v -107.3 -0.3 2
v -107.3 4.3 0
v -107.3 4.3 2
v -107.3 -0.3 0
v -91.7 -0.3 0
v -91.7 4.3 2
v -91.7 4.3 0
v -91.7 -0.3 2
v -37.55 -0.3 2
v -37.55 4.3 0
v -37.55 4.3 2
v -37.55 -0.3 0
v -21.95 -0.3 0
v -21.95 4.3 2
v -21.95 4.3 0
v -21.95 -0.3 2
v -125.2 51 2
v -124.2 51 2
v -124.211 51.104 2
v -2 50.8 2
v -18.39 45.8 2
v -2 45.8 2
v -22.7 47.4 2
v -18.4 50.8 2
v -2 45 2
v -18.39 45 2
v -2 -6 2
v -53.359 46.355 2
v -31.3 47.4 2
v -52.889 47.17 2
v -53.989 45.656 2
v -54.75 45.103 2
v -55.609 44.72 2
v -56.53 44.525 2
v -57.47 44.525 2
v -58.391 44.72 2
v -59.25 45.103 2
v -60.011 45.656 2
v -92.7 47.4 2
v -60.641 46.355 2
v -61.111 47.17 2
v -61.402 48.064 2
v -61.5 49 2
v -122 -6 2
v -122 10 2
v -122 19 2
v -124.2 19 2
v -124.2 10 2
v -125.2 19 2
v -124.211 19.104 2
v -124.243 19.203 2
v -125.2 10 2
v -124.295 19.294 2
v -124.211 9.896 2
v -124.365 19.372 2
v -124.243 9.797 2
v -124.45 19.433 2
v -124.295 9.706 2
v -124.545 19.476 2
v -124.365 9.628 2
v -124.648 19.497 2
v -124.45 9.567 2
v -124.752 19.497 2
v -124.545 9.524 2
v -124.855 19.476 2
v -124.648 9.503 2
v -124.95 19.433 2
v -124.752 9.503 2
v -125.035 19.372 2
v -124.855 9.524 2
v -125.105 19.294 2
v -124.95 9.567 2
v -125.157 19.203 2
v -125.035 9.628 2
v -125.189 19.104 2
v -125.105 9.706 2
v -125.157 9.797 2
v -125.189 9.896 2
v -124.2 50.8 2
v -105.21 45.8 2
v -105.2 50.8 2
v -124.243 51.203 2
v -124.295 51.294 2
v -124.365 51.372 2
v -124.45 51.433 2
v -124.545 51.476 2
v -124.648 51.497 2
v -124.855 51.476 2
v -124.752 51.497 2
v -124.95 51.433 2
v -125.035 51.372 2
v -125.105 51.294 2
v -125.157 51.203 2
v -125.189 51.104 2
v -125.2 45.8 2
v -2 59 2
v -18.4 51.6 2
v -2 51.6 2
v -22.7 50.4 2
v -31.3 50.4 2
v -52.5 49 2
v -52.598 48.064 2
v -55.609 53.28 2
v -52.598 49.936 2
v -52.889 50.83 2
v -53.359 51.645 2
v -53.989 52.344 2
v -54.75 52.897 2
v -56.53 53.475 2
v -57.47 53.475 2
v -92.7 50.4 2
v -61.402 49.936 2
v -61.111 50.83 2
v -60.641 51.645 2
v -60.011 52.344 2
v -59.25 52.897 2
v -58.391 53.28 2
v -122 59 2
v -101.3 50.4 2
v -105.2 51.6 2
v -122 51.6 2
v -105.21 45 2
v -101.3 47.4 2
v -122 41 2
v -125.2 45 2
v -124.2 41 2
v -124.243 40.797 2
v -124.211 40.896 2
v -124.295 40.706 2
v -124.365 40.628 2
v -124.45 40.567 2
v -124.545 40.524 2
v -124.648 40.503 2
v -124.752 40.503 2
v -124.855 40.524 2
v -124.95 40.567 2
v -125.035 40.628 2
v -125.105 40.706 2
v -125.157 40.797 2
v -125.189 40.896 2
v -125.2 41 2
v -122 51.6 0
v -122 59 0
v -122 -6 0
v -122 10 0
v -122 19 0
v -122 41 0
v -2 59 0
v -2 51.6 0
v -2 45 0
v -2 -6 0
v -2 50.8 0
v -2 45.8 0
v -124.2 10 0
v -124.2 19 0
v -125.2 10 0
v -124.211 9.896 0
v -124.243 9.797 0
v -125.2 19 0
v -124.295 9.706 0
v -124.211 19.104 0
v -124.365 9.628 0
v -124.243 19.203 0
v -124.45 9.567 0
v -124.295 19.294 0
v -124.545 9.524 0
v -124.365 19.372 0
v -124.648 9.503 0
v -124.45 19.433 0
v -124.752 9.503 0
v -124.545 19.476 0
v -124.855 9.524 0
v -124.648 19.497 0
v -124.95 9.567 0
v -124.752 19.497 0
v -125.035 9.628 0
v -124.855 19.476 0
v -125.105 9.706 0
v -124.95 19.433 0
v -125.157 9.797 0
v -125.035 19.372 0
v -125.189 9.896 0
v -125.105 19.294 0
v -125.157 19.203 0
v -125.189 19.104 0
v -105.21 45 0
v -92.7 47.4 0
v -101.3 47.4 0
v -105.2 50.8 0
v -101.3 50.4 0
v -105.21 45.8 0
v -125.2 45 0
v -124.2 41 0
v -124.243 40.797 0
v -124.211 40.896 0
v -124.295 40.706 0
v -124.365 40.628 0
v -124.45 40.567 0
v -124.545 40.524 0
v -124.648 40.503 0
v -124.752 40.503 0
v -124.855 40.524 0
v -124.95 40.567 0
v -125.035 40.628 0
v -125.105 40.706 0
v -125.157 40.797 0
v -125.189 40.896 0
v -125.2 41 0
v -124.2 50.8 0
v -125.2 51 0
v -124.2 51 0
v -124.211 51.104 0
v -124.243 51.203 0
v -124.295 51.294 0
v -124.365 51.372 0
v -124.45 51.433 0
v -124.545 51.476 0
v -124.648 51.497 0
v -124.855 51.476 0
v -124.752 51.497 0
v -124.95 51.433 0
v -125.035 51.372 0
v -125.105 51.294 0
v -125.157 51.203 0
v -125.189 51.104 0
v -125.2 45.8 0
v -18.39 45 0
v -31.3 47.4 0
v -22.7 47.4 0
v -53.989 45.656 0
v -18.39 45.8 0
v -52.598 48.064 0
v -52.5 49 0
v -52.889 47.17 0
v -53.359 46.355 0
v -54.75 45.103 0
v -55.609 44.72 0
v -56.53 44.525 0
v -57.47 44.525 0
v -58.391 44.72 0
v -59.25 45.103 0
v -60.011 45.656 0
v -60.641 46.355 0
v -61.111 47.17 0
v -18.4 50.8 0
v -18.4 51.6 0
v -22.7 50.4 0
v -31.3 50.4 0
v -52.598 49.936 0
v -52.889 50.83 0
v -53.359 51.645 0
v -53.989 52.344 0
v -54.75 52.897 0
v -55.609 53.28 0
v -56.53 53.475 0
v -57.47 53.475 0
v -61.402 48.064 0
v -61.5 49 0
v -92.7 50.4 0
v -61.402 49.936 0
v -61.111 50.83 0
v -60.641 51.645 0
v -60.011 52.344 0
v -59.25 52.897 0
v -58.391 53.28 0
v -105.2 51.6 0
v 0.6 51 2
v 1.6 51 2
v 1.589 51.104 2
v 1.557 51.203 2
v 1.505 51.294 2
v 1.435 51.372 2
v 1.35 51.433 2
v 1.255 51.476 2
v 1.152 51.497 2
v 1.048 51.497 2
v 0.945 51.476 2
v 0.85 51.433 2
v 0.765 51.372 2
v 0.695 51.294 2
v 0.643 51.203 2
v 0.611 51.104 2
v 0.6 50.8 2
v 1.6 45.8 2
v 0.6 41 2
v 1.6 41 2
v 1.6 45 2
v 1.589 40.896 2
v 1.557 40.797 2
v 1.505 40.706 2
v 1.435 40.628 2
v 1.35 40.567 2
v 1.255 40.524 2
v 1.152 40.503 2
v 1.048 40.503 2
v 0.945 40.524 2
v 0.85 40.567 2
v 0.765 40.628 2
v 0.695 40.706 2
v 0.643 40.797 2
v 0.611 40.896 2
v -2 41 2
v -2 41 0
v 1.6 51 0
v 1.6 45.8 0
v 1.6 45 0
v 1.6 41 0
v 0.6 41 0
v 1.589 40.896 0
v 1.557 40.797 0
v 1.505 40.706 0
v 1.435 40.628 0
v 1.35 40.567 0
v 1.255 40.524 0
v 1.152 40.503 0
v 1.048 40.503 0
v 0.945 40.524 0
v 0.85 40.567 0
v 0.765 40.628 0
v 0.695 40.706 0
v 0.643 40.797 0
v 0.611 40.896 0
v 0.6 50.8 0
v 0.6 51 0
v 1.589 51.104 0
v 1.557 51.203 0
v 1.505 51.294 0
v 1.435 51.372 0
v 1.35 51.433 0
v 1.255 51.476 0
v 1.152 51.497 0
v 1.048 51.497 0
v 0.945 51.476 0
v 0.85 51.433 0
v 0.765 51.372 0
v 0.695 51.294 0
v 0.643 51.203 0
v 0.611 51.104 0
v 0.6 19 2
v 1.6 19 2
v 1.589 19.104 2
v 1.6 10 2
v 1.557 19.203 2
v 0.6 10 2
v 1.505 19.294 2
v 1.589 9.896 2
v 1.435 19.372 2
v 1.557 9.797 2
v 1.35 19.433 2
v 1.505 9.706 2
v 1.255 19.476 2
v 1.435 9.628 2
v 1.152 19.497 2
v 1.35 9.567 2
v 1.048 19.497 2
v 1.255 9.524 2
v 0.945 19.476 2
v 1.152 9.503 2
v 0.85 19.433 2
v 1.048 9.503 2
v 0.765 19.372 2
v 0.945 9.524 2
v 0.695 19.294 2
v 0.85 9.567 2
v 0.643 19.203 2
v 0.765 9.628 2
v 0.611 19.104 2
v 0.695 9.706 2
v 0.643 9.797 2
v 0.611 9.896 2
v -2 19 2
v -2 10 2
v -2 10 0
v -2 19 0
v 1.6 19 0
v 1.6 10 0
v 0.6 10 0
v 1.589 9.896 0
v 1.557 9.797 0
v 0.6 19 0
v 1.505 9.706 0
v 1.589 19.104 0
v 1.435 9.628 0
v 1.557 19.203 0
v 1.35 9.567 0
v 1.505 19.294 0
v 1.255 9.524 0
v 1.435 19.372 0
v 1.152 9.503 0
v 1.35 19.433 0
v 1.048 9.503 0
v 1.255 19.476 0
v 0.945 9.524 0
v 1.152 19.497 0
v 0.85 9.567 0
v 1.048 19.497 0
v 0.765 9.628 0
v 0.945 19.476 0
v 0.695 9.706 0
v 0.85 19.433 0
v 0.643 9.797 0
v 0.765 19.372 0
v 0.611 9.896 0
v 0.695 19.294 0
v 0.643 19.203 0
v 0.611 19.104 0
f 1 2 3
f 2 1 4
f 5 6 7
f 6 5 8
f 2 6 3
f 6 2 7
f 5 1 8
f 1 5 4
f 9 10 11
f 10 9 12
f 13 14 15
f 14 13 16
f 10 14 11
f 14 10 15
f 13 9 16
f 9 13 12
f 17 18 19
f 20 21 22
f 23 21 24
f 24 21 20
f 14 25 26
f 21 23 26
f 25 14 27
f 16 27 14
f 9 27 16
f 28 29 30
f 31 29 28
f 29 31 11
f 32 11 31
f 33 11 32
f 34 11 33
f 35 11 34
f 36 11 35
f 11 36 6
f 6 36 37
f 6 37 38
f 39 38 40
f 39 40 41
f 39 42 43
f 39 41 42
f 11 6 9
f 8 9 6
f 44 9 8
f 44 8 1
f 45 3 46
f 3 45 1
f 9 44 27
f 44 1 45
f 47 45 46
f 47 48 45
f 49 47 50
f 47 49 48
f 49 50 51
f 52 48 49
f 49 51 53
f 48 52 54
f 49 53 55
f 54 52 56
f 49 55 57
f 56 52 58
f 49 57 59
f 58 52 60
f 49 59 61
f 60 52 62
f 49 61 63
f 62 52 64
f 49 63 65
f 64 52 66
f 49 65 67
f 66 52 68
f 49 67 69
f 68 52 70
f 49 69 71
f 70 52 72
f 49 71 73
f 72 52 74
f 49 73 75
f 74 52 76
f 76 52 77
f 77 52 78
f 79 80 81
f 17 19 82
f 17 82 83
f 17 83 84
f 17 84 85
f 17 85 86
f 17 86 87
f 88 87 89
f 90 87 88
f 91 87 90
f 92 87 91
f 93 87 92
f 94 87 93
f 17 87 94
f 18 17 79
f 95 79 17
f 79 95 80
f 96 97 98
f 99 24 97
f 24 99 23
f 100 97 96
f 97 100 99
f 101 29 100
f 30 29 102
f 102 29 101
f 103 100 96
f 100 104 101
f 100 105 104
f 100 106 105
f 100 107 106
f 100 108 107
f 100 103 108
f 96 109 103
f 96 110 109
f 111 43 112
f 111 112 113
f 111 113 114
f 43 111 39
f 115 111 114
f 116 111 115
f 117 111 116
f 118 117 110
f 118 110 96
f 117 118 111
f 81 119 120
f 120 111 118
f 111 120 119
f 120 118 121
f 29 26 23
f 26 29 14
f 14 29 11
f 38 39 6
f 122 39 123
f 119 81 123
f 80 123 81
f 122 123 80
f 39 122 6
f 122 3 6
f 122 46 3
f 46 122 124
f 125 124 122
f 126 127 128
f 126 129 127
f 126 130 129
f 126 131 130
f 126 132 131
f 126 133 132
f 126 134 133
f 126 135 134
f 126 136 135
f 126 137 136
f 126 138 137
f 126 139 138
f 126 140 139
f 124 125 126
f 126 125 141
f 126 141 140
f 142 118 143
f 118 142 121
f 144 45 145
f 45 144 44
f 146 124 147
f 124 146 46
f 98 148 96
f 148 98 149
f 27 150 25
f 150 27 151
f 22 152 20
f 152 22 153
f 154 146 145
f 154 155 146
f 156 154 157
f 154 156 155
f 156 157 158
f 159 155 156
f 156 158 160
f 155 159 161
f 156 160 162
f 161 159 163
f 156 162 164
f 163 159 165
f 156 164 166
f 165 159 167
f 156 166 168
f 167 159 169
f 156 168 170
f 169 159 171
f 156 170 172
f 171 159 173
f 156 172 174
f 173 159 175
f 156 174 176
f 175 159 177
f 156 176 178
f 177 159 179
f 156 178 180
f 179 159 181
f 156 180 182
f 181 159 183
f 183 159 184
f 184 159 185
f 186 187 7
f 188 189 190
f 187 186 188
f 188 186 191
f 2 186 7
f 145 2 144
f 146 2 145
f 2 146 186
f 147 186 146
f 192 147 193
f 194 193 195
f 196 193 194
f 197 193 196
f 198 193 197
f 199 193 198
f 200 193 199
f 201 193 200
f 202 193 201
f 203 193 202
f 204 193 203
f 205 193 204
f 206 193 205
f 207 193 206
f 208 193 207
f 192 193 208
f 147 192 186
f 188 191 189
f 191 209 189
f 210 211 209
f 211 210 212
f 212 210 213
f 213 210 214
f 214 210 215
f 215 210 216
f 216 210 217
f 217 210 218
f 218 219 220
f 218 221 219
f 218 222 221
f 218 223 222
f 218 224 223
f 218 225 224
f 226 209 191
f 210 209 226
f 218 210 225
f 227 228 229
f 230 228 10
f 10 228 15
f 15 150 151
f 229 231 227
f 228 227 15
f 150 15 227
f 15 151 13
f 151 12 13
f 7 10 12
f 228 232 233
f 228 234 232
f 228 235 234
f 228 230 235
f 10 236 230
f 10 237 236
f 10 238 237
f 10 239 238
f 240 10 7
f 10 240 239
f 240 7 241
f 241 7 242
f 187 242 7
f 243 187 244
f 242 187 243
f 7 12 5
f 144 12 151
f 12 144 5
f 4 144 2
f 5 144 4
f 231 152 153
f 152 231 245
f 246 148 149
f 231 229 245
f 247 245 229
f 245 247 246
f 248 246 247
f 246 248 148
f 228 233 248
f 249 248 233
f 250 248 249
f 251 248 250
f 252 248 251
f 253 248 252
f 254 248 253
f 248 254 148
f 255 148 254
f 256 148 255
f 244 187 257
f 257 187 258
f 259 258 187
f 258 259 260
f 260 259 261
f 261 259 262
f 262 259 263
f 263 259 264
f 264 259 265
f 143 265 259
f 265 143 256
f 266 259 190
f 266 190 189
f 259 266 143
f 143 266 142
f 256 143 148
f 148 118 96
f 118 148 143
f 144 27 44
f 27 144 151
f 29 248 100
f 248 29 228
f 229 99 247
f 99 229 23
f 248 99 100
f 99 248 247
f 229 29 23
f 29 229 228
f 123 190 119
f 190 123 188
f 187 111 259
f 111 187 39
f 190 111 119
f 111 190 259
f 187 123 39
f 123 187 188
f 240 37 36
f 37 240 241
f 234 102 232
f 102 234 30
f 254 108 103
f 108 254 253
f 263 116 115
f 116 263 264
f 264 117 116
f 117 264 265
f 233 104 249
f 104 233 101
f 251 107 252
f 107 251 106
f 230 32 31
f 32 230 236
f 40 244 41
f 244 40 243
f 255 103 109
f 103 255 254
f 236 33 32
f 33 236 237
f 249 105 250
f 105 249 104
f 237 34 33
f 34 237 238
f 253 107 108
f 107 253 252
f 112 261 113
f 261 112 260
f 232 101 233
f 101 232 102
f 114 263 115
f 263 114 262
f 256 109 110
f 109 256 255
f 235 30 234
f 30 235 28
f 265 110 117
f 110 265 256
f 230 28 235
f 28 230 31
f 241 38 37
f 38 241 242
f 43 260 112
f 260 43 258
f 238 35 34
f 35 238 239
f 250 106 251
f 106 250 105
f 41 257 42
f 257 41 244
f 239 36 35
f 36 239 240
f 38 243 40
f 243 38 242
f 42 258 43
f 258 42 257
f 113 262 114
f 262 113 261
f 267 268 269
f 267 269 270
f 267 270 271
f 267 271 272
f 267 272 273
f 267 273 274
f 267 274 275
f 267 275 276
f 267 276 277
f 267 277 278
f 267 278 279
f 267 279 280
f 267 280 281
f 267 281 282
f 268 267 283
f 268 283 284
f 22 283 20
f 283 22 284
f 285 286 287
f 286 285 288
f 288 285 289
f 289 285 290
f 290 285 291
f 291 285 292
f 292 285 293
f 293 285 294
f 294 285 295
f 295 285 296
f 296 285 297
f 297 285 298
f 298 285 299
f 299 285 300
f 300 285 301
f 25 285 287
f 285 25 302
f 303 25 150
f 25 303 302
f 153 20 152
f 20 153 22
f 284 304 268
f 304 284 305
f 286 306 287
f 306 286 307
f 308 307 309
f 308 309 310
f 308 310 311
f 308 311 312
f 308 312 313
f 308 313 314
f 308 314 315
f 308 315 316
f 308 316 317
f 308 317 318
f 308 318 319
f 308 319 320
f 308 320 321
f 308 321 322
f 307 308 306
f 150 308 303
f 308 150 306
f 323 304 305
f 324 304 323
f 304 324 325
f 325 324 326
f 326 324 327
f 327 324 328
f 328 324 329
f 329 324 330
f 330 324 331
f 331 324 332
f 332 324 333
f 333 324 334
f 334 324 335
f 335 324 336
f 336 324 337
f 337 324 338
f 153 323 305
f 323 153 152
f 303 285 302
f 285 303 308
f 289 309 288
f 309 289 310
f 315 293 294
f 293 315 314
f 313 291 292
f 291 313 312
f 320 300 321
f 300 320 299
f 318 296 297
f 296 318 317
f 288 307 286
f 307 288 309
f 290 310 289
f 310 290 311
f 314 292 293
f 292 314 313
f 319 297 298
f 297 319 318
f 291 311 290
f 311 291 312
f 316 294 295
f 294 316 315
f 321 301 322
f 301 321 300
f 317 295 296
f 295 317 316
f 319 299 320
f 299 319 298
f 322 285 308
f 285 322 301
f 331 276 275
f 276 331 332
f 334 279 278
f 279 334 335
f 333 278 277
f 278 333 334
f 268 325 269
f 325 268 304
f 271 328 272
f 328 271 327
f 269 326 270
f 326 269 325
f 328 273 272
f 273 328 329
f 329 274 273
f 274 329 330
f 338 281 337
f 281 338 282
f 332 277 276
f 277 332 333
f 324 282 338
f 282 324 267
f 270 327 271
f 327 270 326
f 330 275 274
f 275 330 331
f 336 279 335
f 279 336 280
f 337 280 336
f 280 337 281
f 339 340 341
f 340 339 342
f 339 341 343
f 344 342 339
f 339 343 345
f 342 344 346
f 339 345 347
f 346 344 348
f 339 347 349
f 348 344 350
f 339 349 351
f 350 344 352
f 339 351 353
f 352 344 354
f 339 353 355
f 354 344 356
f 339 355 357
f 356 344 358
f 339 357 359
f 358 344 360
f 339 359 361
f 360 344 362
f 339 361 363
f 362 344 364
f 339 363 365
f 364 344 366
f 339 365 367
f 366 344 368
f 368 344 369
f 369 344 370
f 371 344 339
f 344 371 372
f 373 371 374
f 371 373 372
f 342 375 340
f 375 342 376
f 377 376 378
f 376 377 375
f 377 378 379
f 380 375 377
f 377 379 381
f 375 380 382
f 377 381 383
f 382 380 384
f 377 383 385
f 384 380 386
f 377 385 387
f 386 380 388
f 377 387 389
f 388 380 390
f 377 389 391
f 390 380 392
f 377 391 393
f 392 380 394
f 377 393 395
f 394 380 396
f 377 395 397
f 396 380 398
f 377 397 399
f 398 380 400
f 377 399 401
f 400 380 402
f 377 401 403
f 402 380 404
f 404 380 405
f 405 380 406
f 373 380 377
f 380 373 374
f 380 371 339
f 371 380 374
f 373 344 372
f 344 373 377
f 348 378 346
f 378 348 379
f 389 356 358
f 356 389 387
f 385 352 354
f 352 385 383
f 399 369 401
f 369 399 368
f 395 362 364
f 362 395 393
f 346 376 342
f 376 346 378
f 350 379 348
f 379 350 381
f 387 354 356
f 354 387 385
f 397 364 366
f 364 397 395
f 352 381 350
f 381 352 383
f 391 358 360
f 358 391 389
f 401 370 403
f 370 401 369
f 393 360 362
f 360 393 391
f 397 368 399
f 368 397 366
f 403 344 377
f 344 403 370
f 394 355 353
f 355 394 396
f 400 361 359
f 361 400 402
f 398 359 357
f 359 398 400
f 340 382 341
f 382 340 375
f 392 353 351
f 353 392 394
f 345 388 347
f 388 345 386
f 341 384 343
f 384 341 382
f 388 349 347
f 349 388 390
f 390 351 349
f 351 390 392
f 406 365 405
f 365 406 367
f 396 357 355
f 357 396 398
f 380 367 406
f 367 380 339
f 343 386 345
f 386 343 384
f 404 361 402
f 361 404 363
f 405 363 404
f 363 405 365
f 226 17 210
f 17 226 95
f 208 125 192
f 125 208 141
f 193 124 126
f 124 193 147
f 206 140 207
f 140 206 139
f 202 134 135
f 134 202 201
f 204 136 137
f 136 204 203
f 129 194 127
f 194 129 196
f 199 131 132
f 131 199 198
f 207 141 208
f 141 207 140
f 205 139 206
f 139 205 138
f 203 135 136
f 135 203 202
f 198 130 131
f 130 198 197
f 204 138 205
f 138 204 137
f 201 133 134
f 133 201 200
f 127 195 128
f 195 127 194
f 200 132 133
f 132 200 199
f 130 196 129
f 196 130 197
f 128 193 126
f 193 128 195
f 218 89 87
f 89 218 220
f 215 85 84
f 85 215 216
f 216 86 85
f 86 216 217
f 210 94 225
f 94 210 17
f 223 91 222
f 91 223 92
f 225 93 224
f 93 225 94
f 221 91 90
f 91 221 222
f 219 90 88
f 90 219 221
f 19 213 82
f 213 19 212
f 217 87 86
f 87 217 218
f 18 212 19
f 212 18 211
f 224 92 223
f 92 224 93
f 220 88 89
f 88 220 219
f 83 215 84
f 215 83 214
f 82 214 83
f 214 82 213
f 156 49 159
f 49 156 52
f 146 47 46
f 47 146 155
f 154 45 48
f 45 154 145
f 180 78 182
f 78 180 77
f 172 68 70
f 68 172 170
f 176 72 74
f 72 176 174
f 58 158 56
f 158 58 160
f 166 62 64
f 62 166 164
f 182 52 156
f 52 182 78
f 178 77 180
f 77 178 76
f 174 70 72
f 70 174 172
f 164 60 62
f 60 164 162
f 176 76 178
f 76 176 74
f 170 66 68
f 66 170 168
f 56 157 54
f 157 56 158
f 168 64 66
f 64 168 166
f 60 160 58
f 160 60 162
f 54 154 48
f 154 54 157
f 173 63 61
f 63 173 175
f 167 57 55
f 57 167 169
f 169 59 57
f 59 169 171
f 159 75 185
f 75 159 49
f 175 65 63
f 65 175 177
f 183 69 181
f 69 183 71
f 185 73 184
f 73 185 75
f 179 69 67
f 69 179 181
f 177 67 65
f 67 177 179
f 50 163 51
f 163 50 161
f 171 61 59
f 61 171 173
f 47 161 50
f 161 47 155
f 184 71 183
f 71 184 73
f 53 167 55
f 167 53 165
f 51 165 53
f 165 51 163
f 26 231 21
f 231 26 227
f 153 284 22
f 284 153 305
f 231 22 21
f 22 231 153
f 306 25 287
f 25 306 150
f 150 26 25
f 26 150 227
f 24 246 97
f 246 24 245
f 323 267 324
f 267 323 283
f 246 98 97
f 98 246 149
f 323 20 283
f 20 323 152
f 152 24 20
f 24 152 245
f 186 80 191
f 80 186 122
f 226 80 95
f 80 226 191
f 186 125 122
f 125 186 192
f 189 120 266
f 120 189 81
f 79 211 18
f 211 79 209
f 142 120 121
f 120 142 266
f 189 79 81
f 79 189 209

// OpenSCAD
include <whole_case.scad>

rotate([0,-90,0]) translate([-width-wall,0,0]) left_panel();
